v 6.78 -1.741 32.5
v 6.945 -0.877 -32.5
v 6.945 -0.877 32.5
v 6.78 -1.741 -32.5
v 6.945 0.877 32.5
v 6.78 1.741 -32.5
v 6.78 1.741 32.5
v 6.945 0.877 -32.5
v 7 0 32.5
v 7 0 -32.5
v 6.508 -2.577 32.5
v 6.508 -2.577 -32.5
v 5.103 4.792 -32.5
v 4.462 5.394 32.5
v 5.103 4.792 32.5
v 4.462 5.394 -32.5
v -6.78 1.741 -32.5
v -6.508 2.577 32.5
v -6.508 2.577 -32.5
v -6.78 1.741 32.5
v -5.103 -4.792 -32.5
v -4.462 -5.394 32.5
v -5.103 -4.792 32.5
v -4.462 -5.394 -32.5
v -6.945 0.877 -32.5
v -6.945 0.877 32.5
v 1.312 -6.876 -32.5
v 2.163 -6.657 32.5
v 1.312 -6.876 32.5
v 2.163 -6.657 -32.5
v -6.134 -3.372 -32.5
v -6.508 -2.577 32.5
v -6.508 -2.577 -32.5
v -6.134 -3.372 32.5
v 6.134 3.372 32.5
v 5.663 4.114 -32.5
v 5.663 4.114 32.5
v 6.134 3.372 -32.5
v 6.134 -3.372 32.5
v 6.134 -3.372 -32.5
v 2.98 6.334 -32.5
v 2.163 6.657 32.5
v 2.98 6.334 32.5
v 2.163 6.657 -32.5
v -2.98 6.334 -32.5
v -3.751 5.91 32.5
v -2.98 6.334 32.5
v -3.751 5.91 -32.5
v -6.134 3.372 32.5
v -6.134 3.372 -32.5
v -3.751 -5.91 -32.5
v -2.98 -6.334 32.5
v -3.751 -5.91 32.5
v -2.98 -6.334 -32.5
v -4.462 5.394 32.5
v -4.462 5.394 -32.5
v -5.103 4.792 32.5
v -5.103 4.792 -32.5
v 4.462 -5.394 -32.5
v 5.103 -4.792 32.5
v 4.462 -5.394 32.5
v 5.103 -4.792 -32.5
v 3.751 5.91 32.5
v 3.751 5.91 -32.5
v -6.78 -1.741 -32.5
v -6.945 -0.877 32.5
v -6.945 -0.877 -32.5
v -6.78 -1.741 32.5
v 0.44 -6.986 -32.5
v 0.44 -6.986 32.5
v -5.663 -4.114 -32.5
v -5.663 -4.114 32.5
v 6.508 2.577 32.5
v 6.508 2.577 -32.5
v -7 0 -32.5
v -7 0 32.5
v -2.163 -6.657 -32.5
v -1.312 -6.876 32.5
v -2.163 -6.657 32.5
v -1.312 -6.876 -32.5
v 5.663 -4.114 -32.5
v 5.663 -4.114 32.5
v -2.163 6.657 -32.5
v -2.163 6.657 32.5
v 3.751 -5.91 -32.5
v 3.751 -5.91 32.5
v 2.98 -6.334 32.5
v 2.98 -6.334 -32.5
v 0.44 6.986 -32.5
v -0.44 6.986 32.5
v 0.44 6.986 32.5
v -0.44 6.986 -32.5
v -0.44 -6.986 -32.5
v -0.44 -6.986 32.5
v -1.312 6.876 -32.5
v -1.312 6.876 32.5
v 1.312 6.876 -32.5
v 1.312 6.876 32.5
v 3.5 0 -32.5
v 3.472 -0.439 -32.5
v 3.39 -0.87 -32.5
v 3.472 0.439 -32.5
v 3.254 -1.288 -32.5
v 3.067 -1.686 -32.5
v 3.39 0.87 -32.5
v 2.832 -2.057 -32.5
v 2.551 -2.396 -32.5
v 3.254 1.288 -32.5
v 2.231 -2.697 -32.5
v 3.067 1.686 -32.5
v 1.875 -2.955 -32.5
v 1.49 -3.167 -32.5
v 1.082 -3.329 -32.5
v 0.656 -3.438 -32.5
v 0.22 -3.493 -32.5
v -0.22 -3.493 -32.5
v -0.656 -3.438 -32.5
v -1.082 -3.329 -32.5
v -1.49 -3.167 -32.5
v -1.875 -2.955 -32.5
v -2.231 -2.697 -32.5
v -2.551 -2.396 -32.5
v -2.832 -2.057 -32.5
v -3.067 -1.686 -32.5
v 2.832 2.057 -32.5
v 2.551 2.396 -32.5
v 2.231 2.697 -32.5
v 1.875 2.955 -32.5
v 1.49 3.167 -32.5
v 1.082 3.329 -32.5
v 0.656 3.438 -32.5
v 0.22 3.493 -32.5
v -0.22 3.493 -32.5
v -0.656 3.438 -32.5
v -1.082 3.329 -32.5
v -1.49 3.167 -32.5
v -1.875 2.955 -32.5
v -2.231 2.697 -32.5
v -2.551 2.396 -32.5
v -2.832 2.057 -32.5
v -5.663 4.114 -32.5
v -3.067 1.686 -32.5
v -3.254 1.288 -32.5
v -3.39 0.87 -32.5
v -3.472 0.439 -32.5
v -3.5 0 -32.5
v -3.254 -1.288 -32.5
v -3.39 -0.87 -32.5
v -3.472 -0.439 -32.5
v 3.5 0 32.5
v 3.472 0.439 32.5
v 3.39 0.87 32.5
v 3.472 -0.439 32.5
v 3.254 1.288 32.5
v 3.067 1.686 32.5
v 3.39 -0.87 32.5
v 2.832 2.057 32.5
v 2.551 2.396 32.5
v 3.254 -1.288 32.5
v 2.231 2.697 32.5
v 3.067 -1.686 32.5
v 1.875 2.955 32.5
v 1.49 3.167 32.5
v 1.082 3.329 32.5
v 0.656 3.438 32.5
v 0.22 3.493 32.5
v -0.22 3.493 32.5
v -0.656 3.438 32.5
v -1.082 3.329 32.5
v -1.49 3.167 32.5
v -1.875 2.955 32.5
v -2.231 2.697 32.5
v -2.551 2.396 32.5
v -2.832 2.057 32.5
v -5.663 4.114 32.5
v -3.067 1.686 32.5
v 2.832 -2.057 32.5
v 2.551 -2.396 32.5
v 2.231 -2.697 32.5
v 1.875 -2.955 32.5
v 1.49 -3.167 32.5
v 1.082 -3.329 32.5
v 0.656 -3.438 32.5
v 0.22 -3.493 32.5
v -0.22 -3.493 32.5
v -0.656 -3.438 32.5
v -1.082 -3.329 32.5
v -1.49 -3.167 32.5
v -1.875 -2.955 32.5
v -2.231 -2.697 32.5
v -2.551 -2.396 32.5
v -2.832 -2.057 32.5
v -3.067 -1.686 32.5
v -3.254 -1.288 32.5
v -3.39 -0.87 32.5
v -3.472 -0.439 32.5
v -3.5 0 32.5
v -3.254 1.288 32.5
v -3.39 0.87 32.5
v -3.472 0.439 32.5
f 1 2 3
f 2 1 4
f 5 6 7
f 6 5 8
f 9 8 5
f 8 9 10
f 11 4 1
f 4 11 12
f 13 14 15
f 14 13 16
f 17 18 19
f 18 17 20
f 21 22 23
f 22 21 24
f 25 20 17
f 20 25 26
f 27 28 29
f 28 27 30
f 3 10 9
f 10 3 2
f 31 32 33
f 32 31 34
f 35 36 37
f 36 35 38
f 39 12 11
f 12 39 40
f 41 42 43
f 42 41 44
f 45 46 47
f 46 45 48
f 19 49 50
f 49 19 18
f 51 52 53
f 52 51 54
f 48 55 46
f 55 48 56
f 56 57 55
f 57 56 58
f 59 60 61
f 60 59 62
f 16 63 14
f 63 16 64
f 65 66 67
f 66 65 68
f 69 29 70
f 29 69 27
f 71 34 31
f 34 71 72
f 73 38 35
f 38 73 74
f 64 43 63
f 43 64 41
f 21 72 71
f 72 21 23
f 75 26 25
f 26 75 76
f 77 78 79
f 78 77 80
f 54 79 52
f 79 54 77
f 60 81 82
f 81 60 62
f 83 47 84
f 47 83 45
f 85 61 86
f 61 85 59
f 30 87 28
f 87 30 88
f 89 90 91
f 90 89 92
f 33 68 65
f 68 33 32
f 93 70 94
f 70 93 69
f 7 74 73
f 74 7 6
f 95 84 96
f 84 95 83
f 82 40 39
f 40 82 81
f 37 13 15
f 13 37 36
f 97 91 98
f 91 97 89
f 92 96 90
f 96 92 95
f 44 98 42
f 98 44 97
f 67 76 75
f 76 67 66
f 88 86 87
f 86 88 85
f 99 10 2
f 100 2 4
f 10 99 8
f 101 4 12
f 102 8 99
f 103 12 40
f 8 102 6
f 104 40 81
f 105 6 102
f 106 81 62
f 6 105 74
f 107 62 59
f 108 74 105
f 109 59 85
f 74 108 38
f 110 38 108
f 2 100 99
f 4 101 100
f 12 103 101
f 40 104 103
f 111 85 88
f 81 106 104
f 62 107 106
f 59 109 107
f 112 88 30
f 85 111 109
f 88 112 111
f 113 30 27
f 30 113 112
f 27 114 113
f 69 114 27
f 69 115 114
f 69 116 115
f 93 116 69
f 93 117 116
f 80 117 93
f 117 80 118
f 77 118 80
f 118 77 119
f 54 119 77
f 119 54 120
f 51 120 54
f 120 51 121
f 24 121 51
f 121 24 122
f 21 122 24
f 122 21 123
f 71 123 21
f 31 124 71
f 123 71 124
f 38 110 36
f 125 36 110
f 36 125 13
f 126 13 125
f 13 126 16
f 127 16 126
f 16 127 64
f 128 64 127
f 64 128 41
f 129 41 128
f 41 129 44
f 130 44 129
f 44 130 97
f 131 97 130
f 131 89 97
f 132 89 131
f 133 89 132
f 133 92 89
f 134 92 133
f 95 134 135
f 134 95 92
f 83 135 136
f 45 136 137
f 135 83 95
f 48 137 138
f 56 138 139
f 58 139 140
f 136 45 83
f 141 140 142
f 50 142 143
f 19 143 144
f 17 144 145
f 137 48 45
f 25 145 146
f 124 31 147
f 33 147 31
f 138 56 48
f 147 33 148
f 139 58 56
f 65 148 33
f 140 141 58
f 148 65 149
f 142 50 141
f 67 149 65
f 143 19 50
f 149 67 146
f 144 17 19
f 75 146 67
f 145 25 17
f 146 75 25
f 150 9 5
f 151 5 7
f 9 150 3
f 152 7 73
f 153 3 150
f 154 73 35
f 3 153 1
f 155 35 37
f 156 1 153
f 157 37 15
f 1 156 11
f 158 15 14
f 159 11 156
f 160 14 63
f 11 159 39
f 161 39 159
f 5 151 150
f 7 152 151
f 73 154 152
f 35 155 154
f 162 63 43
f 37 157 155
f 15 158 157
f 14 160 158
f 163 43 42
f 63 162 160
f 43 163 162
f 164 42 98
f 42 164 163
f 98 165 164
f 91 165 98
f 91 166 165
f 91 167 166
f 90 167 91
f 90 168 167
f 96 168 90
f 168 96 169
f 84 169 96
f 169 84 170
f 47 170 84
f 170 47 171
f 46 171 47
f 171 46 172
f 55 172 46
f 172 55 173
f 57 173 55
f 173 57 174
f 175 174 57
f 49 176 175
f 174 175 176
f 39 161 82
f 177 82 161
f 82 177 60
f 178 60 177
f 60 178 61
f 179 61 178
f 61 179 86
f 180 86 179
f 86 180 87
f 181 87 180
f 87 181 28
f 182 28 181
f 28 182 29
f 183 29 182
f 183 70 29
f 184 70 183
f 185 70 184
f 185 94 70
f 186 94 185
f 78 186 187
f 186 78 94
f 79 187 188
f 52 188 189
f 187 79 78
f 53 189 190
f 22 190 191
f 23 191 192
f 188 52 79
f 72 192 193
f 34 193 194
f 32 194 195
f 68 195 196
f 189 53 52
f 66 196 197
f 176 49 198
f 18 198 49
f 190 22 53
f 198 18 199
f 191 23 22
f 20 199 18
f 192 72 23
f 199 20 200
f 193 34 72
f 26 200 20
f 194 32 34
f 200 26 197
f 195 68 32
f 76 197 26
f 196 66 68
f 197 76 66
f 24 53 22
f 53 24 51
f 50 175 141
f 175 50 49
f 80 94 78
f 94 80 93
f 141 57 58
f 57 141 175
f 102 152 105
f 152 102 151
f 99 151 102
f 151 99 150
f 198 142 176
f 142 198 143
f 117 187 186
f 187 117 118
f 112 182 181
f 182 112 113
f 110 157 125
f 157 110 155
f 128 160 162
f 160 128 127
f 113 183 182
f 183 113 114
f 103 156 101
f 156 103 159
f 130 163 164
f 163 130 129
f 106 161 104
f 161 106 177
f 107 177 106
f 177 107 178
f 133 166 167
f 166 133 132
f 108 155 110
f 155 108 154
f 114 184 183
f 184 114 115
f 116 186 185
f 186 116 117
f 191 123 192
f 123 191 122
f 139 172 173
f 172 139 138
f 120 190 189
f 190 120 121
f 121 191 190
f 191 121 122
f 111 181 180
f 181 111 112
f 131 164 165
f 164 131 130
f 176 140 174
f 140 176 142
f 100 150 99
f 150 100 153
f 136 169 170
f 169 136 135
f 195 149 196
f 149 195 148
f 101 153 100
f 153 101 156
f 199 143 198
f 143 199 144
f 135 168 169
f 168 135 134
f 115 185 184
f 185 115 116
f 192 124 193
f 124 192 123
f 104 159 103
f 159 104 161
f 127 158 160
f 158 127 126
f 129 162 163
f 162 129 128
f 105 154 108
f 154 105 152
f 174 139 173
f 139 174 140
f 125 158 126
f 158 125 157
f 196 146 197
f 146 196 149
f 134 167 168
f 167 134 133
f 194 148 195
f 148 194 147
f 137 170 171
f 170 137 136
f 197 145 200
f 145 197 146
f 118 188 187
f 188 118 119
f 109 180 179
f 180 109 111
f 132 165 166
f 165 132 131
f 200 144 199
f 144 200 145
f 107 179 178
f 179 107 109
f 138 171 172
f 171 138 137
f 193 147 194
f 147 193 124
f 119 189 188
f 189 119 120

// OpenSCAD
$fn = 50;


difference() {
	union() {
		translate(v = [0, 0, -32.5000000000]) {
			cylinder(h = 65, r = 7.0000000000);
		}
	}
	union() {
		translate(v = [0, 0, -100.0000000000]) {
			cylinder(h = 200, r = 3.5000000000);
		}
	}
}
